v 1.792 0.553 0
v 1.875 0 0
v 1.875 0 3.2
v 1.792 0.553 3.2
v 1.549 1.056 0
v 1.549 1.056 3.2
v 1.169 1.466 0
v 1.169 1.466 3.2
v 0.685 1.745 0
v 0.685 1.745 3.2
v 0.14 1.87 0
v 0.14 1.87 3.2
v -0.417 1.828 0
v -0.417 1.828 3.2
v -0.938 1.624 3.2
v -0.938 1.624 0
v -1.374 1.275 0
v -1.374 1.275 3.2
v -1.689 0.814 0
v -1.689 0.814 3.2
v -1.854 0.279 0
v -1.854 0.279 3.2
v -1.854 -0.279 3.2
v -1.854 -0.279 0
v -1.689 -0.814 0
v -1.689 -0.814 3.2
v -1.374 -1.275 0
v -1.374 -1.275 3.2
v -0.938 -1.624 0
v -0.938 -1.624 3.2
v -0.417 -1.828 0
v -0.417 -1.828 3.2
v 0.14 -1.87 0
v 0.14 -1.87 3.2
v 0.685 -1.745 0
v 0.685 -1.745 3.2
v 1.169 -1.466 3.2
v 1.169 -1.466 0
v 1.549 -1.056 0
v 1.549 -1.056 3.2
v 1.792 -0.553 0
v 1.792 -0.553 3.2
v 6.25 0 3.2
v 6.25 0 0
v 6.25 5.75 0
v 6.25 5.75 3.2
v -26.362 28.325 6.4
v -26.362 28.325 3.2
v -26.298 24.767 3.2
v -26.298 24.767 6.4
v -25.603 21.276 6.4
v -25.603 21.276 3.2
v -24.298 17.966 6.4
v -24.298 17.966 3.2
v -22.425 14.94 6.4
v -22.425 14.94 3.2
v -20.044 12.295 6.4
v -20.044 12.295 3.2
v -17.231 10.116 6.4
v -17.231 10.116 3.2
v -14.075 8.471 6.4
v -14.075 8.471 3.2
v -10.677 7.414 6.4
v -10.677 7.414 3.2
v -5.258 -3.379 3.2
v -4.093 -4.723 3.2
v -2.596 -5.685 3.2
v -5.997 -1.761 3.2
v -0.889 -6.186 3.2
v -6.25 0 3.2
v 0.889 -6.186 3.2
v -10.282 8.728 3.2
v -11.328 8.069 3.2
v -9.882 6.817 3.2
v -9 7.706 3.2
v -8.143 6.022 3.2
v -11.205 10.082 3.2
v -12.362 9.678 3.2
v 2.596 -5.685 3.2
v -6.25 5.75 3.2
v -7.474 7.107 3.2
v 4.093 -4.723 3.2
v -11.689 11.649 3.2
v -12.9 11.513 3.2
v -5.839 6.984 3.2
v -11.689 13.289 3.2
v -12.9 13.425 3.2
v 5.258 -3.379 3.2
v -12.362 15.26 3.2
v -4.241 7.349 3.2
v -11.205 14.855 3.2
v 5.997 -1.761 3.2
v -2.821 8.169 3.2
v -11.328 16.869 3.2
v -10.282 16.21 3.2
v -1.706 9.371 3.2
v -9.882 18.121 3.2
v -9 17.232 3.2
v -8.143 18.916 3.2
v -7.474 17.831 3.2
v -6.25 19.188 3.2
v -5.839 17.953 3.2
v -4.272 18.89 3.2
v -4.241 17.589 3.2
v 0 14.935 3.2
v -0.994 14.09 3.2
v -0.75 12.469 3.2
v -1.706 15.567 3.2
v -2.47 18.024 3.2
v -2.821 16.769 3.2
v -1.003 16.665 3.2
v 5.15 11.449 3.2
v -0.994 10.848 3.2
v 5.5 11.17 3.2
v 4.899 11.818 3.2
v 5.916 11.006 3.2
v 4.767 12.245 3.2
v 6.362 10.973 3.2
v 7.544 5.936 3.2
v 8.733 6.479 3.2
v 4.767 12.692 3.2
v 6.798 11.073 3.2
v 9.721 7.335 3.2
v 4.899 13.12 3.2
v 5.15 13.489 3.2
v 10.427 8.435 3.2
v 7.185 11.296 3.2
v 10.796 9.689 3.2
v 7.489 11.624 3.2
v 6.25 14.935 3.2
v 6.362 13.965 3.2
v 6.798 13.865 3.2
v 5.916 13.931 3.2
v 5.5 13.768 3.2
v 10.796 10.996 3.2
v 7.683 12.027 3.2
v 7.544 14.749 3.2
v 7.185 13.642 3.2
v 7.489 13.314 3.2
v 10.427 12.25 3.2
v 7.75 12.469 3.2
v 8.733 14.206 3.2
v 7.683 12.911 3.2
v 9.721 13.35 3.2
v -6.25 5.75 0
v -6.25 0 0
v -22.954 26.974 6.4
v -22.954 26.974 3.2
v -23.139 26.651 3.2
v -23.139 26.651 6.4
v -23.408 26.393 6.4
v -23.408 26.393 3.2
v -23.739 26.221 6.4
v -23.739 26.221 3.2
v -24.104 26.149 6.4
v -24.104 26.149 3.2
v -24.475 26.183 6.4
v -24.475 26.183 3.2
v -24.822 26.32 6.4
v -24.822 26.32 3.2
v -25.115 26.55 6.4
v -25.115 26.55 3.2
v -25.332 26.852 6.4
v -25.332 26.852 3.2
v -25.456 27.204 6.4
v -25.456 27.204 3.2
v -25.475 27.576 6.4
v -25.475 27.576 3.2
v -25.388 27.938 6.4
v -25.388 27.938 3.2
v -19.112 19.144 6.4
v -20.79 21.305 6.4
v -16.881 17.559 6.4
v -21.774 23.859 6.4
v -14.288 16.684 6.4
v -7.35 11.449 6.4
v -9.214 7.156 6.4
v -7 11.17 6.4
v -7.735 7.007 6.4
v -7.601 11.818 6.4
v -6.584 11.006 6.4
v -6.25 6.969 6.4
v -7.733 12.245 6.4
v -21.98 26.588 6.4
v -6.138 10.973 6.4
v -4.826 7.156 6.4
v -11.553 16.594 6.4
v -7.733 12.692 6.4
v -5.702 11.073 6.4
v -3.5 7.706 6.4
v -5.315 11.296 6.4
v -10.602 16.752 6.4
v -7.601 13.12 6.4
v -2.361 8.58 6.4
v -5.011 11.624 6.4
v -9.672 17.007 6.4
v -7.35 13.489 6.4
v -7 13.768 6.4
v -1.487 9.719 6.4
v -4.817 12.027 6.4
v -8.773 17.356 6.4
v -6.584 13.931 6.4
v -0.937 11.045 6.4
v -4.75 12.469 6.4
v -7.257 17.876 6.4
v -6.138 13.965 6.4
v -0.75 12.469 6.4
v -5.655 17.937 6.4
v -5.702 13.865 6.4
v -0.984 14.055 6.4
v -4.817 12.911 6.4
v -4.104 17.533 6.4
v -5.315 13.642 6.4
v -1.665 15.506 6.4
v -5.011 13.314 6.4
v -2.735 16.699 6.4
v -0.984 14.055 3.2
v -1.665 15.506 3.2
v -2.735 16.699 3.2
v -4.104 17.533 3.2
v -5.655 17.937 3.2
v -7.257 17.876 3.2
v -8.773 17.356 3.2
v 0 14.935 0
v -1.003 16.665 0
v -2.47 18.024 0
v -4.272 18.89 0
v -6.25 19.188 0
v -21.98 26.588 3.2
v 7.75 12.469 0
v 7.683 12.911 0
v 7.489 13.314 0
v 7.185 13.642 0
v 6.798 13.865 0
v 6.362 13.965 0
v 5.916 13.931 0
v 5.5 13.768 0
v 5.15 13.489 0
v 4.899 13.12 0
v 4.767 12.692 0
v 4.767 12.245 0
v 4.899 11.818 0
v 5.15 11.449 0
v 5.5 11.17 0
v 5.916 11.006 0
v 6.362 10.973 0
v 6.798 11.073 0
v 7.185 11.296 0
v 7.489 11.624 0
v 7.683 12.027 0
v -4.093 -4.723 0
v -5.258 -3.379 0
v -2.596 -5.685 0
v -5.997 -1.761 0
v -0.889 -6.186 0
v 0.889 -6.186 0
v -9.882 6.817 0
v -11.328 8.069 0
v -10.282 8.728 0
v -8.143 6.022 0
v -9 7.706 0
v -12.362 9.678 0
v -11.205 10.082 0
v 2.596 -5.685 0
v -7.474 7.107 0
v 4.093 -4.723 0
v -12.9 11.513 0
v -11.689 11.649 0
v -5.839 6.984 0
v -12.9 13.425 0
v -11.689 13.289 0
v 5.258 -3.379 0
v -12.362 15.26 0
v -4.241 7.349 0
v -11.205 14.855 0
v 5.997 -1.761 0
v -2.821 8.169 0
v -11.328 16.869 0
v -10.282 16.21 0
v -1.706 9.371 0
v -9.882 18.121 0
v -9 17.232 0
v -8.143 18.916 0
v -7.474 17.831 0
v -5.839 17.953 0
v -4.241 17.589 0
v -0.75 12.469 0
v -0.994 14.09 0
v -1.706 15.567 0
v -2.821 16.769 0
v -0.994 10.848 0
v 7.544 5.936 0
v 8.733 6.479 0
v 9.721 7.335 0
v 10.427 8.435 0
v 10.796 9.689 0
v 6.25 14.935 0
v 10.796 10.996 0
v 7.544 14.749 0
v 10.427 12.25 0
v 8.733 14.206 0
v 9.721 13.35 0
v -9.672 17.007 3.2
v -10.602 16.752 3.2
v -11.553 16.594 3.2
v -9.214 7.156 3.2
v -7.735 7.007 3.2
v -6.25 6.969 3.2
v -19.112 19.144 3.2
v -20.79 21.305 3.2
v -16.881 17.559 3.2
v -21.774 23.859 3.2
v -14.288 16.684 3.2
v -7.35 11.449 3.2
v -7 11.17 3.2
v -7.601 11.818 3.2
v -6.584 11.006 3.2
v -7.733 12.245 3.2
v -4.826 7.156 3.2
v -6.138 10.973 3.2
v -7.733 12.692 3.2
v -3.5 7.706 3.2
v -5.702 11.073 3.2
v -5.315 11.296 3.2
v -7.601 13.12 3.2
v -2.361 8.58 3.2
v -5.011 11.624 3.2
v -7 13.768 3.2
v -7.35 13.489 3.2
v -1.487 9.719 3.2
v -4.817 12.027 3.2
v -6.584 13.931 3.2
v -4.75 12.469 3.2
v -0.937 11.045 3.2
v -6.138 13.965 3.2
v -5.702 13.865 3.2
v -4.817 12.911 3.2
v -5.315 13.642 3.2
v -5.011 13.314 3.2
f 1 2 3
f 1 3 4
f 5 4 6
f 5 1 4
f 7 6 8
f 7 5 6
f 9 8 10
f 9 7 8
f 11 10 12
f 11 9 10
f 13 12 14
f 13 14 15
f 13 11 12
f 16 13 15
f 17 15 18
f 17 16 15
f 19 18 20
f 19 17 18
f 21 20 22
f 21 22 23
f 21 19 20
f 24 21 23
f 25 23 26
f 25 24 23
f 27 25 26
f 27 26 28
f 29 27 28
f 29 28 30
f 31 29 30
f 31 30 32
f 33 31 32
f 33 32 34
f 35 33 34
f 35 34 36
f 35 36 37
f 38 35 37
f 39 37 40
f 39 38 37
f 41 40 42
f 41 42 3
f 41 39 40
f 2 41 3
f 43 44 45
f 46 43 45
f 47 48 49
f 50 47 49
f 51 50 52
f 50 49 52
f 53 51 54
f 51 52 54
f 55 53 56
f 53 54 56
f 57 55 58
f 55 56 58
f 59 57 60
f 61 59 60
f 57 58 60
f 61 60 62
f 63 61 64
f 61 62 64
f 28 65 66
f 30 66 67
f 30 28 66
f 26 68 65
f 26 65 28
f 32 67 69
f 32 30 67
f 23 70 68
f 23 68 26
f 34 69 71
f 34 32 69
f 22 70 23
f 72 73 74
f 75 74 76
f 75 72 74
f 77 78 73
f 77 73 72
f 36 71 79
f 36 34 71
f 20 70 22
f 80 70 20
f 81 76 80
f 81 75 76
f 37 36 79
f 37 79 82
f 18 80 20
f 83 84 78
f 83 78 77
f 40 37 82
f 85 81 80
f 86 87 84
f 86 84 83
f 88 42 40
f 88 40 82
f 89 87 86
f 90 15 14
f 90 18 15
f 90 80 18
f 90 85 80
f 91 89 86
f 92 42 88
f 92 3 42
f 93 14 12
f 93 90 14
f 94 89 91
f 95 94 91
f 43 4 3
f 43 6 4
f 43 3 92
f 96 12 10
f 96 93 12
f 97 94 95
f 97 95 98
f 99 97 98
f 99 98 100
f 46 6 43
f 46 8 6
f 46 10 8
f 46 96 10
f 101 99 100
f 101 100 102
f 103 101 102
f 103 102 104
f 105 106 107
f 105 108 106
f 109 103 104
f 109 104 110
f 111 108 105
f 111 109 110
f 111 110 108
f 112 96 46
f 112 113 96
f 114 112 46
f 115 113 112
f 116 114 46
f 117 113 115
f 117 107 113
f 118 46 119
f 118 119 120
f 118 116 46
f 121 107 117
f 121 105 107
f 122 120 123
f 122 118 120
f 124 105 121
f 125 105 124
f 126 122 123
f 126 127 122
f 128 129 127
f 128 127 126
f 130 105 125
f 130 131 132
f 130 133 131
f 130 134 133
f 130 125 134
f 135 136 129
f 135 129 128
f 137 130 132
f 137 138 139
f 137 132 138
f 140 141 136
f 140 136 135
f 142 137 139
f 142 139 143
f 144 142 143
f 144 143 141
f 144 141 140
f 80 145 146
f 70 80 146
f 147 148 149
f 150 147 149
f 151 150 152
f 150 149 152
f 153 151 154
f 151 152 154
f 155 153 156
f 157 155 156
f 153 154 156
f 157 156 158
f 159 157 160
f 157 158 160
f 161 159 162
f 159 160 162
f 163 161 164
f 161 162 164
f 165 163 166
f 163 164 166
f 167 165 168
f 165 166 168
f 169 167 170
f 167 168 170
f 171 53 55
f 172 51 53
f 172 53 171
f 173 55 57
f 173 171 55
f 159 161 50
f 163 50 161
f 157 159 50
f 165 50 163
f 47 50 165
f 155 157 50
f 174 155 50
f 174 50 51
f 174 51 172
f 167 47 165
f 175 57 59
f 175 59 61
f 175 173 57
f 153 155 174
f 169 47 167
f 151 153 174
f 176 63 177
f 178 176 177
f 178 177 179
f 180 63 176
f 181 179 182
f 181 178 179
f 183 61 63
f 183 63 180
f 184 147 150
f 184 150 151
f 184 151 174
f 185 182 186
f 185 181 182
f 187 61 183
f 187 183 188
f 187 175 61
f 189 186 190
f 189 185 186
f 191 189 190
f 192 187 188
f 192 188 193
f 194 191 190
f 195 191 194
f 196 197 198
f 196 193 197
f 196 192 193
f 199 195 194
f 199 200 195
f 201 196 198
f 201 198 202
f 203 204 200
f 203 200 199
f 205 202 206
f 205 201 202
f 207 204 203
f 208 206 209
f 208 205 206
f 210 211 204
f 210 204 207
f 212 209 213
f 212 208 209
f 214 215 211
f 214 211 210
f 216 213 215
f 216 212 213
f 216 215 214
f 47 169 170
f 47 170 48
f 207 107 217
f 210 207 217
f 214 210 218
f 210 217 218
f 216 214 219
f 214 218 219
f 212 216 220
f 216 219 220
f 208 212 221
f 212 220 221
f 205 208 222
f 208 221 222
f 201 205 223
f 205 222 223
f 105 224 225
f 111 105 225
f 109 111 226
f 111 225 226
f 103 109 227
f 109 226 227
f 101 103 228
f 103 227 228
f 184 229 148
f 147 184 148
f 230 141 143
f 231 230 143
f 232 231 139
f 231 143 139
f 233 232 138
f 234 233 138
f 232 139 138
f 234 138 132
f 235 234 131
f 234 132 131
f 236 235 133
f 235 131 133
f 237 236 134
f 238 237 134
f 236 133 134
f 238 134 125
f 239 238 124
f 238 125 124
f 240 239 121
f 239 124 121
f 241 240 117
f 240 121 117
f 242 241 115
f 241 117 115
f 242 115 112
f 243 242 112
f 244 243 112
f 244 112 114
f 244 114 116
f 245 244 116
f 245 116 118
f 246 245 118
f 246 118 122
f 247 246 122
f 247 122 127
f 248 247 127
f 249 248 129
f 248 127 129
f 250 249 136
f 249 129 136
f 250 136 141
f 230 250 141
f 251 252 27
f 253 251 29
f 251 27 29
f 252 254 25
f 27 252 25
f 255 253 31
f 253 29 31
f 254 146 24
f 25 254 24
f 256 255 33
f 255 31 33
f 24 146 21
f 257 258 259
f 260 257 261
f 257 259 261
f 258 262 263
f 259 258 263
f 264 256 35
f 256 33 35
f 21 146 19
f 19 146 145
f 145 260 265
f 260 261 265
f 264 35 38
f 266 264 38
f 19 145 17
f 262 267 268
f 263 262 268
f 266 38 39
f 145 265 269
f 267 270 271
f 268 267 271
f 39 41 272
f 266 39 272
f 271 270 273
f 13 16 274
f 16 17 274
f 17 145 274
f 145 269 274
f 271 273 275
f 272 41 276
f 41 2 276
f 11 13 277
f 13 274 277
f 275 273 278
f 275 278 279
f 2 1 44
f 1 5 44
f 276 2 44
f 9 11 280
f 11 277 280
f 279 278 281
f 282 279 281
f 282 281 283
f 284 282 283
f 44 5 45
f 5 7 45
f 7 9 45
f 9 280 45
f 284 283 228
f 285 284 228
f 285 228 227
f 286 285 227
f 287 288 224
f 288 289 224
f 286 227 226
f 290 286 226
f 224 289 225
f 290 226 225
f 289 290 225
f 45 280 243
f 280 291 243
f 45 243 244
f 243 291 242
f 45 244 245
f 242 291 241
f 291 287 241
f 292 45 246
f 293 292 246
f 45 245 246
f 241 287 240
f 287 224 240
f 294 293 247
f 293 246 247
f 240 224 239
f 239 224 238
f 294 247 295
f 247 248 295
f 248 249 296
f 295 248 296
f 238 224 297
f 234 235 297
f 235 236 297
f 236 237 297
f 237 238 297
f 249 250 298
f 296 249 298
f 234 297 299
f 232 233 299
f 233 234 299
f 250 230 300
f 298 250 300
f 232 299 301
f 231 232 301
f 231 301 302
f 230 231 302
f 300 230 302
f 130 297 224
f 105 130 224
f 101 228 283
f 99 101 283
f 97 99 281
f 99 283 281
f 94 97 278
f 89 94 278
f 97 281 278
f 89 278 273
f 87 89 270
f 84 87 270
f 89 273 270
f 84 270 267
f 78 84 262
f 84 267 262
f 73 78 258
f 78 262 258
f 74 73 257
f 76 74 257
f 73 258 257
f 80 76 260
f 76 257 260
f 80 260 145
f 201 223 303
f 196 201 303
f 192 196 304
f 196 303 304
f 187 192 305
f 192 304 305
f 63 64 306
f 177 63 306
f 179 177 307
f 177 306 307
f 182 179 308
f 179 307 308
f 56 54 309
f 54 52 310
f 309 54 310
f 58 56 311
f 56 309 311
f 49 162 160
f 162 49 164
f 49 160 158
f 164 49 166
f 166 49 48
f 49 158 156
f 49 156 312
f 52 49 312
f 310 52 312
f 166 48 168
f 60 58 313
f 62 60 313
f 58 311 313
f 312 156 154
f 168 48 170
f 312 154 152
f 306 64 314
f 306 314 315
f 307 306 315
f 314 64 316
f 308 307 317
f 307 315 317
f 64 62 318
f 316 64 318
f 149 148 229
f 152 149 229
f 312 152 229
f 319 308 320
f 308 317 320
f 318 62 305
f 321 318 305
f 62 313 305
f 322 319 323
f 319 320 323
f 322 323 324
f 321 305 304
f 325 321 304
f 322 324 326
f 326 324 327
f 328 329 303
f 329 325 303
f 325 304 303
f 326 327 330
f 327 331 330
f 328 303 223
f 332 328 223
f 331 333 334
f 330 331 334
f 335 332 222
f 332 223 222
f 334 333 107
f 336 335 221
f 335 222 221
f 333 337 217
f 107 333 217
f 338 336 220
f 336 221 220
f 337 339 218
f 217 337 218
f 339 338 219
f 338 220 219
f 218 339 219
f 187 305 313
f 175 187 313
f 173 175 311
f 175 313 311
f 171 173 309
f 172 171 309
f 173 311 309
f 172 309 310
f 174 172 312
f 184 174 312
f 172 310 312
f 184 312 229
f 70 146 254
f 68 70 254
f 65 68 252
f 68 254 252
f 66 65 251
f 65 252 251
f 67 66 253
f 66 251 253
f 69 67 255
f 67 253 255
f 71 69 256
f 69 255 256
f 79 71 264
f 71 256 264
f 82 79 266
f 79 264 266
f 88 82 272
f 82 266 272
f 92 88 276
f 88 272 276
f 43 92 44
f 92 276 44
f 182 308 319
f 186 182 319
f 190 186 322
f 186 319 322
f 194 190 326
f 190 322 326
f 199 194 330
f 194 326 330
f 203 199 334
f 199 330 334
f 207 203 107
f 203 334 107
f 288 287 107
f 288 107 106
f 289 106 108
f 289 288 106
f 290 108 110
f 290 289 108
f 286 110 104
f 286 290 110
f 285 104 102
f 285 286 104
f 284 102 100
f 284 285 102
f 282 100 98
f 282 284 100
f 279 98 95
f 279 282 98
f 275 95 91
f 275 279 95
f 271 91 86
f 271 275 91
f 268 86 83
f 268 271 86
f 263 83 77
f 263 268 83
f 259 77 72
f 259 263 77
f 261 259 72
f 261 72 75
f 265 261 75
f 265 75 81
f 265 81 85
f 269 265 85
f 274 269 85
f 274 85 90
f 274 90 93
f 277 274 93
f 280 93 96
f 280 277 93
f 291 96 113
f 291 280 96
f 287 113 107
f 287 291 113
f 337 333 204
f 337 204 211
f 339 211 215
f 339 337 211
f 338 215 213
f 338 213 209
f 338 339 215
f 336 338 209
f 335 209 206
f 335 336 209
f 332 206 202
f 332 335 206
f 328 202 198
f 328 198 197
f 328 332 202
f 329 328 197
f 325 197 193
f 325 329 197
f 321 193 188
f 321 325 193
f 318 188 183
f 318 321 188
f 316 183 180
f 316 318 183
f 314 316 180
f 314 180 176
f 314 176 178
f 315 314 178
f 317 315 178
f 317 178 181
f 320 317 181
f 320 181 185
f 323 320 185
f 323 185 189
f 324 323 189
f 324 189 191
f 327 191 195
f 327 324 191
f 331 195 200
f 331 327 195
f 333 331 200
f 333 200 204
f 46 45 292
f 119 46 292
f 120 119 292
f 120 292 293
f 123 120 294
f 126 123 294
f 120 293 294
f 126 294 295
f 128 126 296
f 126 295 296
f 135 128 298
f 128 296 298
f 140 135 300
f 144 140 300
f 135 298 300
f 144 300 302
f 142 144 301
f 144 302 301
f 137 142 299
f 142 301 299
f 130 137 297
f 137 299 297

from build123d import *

# Parameters (mm, degrees)
F0_R     = 1.875
F0_R_2   = 5.5
F1_DEPTH = 3.2
F3_R     = 1.5
F4_DEPTH = 3.2
F2_R     = 1.5
F5_DEPTH = 3.2


with BuildPart() as f1:
    # F0 (on Top) → F1 (new body)
    with BuildSketch(Plane.XY):
        with BuildLine():
            ThreePointArc((-6.25, 19.187701866), (-12.968850933, 12.468850933), (-6.25, 5.75))
            Line((-6.25, 5.75), (-6.25, 0))
            ThreePointArc((-6.25, 0), (0, -6.25), (6.25, 0))
            Line((6.25, 0), (6.25, 5.75))
            ThreePointArc((6.25, 5.75), (10.8423546879, 10.3423546879), (6.25, 14.9347093758))
            Line((6.25, 14.9347093758), (0, 14.9347093758))
            ThreePointArc((0, 14.9347093758), (-2.4701043294, 18.0236098458), (-6.25, 19.187701866))
        make_face()
        Circle(F0_R, mode=Mode.SUBTRACT)
        with Locations((-6.25, 12.468850933)):
            Circle(F0_R_2, mode=Mode.SUBTRACT)
    extrude(amount=F1_DEPTH)

    # F2 (on face) → F5 (cut, through all)
    with BuildSketch(Plane.XY.offset(3.2)):
        with Locations((6.25, 12.468850933)):
            Circle(F2_R)
    extrude(amount=-F5_DEPTH, mode=Mode.SUBTRACT)


with BuildPart() as f4:
    # F3 (on face) → F4 (new body)
    with BuildSketch(Plane.XY.offset(3.2)):
        with BuildLine():
            ThreePointArc((-8.7732377369, 17.3559023265), (-11.5945665243, 11.1705410055), (-6.25, 6.968850933))
            ThreePointArc((-6.25, 6.968850933), (-2.3609127035, 8.5797636365), (-0.75, 12.468850933))
            ThreePointArc((-0.75, 12.468850933), (-3.388864522, 17.1660739186), (-8.7732377369, 17.3559023265))
        make_face()
        with Locations((-6.25, 12.468850933)):
            Circle(F3_R, mode=Mode.SUBTRACT)
        with BuildLine():
            ThreePointArc((-10.6767033745, 7.4144216779), (-8.4758217458, 7.0677474483), (-6.25, 6.968850933))
            ThreePointArc((-6.25, 6.968850933), (-11.5945665243, 11.1705410055), (-8.7732377369, 17.3559023265))
            ThreePointArc((-8.7732377369, 17.3559023265), (-10.1339419751, 16.8675420062), (-11.5534928512, 16.5938868646))
            ThreePointArc((-11.5534928512, 16.5938868646), (-12.9384097457, 11.8299981064), (-10.6767033745, 7.4144216779))
        make_face()
        with BuildLine():
            ThreePointArc((-26.3622067869, 28.3246971667), (-22.4253559313, 14.9396113614), (-10.6767033745, 7.4144216779))
            ThreePointArc((-10.6767033745, 7.4144216779), (-12.9384097457, 11.8299981064), (-11.5534928512, 16.5938868646))
            ThreePointArc((-11.5534928512, 16.5938868646), (-19.1117610171, 19.1441645492), (-21.9799764454, 26.5875961632))
            Line((-21.9799764454, 26.5875961632), (-22.9542631916, 26.9738000713))
            ThreePointArc((-22.9542631916, 26.9738000713), (-24.6534382097, 26.2393182404), (-25.3879200407, 27.9384932585))
            Line((-25.3879200407, 27.9384932585), (-26.3622067869, 28.3246971667))
        make_face()
    extrude(amount=F4_DEPTH)


solid = Compound([f1.part, f4.part])
